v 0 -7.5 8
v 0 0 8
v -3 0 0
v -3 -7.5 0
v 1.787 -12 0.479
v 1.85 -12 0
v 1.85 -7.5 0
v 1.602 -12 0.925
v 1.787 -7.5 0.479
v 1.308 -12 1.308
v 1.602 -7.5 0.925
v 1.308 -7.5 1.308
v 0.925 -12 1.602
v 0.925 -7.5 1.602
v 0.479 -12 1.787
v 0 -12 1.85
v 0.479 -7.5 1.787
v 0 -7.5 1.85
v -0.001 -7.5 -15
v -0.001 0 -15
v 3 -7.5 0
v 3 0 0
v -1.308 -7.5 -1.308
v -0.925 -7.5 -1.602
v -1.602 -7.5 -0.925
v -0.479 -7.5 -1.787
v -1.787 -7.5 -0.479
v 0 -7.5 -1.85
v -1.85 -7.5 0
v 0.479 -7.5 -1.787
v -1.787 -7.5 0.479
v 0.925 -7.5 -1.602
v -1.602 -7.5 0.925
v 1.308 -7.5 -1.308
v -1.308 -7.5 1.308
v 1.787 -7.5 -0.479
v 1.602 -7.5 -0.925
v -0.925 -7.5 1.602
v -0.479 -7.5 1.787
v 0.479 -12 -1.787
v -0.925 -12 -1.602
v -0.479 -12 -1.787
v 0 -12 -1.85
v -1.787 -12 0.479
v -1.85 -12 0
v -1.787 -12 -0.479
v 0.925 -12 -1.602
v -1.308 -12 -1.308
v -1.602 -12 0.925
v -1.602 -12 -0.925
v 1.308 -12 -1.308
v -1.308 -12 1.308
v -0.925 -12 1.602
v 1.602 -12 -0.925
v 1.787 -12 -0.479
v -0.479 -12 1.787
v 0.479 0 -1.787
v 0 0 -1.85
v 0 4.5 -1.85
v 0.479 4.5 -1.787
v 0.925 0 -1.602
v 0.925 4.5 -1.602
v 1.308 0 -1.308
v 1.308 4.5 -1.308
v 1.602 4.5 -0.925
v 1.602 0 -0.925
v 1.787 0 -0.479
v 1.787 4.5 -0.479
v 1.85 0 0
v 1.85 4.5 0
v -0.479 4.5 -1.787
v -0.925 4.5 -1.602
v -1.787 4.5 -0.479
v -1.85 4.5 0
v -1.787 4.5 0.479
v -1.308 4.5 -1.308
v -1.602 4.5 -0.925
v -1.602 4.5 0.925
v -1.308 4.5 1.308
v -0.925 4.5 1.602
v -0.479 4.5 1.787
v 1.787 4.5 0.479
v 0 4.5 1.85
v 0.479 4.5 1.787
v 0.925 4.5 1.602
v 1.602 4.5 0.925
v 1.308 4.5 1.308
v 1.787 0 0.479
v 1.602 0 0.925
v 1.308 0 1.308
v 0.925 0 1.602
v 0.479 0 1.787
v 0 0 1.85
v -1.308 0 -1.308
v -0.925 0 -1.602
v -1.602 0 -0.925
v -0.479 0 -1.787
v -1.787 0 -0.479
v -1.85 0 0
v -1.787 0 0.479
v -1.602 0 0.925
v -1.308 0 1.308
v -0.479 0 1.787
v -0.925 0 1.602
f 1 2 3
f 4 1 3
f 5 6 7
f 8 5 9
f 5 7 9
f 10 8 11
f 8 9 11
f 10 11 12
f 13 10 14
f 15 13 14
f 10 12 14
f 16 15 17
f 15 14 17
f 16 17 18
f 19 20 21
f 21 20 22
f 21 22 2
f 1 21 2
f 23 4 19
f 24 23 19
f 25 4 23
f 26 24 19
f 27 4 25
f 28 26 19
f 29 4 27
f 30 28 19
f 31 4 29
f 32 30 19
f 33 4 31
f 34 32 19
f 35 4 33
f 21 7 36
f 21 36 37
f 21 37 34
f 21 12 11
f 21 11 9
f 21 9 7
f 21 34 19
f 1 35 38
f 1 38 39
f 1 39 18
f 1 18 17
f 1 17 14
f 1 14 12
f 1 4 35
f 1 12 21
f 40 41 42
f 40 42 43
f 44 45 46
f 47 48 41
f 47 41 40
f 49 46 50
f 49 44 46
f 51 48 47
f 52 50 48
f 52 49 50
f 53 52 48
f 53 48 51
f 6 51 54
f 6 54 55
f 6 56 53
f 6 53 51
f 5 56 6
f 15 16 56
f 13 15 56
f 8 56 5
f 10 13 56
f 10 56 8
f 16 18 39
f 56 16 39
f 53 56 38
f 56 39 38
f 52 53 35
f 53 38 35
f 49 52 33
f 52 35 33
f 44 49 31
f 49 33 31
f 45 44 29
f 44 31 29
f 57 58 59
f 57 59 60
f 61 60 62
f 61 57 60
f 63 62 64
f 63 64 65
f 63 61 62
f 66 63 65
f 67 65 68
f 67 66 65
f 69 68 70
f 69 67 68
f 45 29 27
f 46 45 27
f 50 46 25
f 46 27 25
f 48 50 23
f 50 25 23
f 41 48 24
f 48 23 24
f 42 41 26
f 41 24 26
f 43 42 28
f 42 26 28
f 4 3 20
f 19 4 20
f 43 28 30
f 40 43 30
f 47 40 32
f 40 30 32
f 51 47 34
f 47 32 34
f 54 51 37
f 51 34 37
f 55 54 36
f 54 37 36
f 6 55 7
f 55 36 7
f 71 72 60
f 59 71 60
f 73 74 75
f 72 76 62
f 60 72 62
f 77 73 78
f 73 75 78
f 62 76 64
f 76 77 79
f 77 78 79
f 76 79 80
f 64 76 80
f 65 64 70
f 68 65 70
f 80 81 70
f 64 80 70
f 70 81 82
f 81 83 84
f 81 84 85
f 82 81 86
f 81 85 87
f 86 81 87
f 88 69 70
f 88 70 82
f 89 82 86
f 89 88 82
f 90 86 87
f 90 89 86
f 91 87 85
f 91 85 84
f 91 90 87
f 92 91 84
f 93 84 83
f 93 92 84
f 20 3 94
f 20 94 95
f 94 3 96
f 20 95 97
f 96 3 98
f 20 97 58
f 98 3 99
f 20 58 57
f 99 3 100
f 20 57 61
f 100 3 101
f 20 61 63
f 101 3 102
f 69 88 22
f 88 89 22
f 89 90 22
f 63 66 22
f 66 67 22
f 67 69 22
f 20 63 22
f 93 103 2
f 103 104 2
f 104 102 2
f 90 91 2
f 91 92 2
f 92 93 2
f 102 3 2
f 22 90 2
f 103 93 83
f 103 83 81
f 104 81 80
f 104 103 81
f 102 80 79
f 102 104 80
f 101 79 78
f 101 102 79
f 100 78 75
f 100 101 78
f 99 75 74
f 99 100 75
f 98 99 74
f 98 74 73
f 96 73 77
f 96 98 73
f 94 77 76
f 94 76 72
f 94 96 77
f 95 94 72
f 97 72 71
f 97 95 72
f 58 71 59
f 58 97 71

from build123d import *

# Parameters (mm, degrees)
F1_DEPTH      = 7.5
F2_DEPTH      = 12
F2_DEPTH_BACK = 4.5


with BuildPart() as f1:
    # F0 (on Front) → F1 (new body)
    with BuildSketch(Plane.XZ):
        with BuildLine():
            Line((2.9999999901, -0.0002442856), (1.8499999939, -0.0001506428))
            ThreePointArc((1.8499999939, -0.0001506428), (1.3080410203, -1.3082540614), (-0.0001506428, -1.8499999939))
            Line((-0.0001506428, -1.8499999939), (-0.0012214281, -14.9999999503))
            Line((-0.0012214281, -14.9999999503), (2.9999999901, -0.0002442856))
        make_face()
        with BuildLine():
            ThreePointArc((-0.0001506428, -1.8499999939), (-1.3082540614, -1.3080410203), (-1.8499999939, 0.0001506428))
            Line((-1.8499999939, 0.0001506428), (-2.9999999901, 0.0002442856))
            Line((-2.9999999901, 0.0002442856), (-0.0012214281, -14.9999999503))
            Line((-0.0012214281, -14.9999999503), (-0.0001506428, -1.8499999939))
        make_face()
        with BuildLine():
            Line((0, 0), (-1.8499999939, 0.0001506428))
            ThreePointArc((-1.8499999939, 0.0001506428), (-1.3082540614, -1.3080410203), (-0.0001506428, -1.8499999939))
            Line((-0.0001506428, -1.8499999939), (0, 0))
        make_face()
        with BuildLine():
            ThreePointArc((-0.0001506428, -1.8499999939), (1.3080410203, -1.3082540614), (1.8499999939, -0.0001506428))
            Line((1.8499999939, -0.0001506428), (0, 0))
            Line((0, 0), (-0.0001506428, -1.8499999939))
        make_face()
        with BuildLine():
            ThreePointArc((1.8499999939, -0.0001506428), (1.8499999985, -7.53214e-05), (1.85, 0))
            ThreePointArc((1.85, 0), (1.3081475452, 1.3081475452), (0, 1.85))
            Line((0, 1.85), (0, 0))
            Line((0, 0), (1.8499999939, -0.0001506428))
        make_face()
        with BuildLine():
            Line((0, 0), (0, 1.85))
            ThreePointArc((0, 1.85), (-1.3080942838, 1.3082008044), (-1.8499999939, 0.0001506428))
            Line((-1.8499999939, 0.0001506428), (0, 0))
        make_face()
        with BuildLine():
            ThreePointArc((-1.8499999939, 0.0001506428), (-1.3080942838, 1.3082008044), (0, 1.85))
            Line((0, 1.85), (0, 8))
            Line((0, 8), (-2.9999999901, 0.0002442856))
            Line((-2.9999999901, 0.0002442856), (-1.8499999939, 0.0001506428))
        make_face()
        with BuildLine():
            ThreePointArc((0, 1.85), (1.3081475452, 1.3081475452), (1.85, 0))
            ThreePointArc((1.85, 0), (1.8499999985, -7.53214e-05), (1.8499999939, -0.0001506428))
            Line((1.8499999939, -0.0001506428), (2.9999999901, -0.0002442856))
            Line((2.9999999901, -0.0002442856), (0, 8))
            Line((0, 8), (0, 1.85))
        make_face()
    extrude(amount=F1_DEPTH)

    # F0 (on Front) → F2 (join, two sides)
    with BuildSketch(Plane.XZ) as f2_sk:
        with BuildLine():
            Line((0, 0), (-1.8499999939, 0.0001506428))
            ThreePointArc((-1.8499999939, 0.0001506428), (-1.3082540614, -1.3080410203), (-0.0001506428, -1.8499999939))
            Line((-0.0001506428, -1.8499999939), (0, 0))
        make_face()
        with BuildLine():
            Line((0, 0), (0, 1.85))
            ThreePointArc((0, 1.85), (-1.3080942838, 1.3082008044), (-1.8499999939, 0.0001506428))
            Line((-1.8499999939, 0.0001506428), (0, 0))
        make_face()
        with BuildLine():
            ThreePointArc((1.8499999939, -0.0001506428), (1.8499999985, -7.53214e-05), (1.85, 0))
            ThreePointArc((1.85, 0), (1.3081475452, 1.3081475452), (0, 1.85))
            Line((0, 1.85), (0, 0))
            Line((0, 0), (1.8499999939, -0.0001506428))
        make_face()
        with BuildLine():
            ThreePointArc((-0.0001506428, -1.8499999939), (1.3080410203, -1.3082540614), (1.8499999939, -0.0001506428))
            Line((1.8499999939, -0.0001506428), (0, 0))
            Line((0, 0), (-0.0001506428, -1.8499999939))
        make_face()
    extrude(amount=F2_DEPTH)
    extrude(f2_sk.sketch, amount=-F2_DEPTH_BACK)


solid = f1.part
